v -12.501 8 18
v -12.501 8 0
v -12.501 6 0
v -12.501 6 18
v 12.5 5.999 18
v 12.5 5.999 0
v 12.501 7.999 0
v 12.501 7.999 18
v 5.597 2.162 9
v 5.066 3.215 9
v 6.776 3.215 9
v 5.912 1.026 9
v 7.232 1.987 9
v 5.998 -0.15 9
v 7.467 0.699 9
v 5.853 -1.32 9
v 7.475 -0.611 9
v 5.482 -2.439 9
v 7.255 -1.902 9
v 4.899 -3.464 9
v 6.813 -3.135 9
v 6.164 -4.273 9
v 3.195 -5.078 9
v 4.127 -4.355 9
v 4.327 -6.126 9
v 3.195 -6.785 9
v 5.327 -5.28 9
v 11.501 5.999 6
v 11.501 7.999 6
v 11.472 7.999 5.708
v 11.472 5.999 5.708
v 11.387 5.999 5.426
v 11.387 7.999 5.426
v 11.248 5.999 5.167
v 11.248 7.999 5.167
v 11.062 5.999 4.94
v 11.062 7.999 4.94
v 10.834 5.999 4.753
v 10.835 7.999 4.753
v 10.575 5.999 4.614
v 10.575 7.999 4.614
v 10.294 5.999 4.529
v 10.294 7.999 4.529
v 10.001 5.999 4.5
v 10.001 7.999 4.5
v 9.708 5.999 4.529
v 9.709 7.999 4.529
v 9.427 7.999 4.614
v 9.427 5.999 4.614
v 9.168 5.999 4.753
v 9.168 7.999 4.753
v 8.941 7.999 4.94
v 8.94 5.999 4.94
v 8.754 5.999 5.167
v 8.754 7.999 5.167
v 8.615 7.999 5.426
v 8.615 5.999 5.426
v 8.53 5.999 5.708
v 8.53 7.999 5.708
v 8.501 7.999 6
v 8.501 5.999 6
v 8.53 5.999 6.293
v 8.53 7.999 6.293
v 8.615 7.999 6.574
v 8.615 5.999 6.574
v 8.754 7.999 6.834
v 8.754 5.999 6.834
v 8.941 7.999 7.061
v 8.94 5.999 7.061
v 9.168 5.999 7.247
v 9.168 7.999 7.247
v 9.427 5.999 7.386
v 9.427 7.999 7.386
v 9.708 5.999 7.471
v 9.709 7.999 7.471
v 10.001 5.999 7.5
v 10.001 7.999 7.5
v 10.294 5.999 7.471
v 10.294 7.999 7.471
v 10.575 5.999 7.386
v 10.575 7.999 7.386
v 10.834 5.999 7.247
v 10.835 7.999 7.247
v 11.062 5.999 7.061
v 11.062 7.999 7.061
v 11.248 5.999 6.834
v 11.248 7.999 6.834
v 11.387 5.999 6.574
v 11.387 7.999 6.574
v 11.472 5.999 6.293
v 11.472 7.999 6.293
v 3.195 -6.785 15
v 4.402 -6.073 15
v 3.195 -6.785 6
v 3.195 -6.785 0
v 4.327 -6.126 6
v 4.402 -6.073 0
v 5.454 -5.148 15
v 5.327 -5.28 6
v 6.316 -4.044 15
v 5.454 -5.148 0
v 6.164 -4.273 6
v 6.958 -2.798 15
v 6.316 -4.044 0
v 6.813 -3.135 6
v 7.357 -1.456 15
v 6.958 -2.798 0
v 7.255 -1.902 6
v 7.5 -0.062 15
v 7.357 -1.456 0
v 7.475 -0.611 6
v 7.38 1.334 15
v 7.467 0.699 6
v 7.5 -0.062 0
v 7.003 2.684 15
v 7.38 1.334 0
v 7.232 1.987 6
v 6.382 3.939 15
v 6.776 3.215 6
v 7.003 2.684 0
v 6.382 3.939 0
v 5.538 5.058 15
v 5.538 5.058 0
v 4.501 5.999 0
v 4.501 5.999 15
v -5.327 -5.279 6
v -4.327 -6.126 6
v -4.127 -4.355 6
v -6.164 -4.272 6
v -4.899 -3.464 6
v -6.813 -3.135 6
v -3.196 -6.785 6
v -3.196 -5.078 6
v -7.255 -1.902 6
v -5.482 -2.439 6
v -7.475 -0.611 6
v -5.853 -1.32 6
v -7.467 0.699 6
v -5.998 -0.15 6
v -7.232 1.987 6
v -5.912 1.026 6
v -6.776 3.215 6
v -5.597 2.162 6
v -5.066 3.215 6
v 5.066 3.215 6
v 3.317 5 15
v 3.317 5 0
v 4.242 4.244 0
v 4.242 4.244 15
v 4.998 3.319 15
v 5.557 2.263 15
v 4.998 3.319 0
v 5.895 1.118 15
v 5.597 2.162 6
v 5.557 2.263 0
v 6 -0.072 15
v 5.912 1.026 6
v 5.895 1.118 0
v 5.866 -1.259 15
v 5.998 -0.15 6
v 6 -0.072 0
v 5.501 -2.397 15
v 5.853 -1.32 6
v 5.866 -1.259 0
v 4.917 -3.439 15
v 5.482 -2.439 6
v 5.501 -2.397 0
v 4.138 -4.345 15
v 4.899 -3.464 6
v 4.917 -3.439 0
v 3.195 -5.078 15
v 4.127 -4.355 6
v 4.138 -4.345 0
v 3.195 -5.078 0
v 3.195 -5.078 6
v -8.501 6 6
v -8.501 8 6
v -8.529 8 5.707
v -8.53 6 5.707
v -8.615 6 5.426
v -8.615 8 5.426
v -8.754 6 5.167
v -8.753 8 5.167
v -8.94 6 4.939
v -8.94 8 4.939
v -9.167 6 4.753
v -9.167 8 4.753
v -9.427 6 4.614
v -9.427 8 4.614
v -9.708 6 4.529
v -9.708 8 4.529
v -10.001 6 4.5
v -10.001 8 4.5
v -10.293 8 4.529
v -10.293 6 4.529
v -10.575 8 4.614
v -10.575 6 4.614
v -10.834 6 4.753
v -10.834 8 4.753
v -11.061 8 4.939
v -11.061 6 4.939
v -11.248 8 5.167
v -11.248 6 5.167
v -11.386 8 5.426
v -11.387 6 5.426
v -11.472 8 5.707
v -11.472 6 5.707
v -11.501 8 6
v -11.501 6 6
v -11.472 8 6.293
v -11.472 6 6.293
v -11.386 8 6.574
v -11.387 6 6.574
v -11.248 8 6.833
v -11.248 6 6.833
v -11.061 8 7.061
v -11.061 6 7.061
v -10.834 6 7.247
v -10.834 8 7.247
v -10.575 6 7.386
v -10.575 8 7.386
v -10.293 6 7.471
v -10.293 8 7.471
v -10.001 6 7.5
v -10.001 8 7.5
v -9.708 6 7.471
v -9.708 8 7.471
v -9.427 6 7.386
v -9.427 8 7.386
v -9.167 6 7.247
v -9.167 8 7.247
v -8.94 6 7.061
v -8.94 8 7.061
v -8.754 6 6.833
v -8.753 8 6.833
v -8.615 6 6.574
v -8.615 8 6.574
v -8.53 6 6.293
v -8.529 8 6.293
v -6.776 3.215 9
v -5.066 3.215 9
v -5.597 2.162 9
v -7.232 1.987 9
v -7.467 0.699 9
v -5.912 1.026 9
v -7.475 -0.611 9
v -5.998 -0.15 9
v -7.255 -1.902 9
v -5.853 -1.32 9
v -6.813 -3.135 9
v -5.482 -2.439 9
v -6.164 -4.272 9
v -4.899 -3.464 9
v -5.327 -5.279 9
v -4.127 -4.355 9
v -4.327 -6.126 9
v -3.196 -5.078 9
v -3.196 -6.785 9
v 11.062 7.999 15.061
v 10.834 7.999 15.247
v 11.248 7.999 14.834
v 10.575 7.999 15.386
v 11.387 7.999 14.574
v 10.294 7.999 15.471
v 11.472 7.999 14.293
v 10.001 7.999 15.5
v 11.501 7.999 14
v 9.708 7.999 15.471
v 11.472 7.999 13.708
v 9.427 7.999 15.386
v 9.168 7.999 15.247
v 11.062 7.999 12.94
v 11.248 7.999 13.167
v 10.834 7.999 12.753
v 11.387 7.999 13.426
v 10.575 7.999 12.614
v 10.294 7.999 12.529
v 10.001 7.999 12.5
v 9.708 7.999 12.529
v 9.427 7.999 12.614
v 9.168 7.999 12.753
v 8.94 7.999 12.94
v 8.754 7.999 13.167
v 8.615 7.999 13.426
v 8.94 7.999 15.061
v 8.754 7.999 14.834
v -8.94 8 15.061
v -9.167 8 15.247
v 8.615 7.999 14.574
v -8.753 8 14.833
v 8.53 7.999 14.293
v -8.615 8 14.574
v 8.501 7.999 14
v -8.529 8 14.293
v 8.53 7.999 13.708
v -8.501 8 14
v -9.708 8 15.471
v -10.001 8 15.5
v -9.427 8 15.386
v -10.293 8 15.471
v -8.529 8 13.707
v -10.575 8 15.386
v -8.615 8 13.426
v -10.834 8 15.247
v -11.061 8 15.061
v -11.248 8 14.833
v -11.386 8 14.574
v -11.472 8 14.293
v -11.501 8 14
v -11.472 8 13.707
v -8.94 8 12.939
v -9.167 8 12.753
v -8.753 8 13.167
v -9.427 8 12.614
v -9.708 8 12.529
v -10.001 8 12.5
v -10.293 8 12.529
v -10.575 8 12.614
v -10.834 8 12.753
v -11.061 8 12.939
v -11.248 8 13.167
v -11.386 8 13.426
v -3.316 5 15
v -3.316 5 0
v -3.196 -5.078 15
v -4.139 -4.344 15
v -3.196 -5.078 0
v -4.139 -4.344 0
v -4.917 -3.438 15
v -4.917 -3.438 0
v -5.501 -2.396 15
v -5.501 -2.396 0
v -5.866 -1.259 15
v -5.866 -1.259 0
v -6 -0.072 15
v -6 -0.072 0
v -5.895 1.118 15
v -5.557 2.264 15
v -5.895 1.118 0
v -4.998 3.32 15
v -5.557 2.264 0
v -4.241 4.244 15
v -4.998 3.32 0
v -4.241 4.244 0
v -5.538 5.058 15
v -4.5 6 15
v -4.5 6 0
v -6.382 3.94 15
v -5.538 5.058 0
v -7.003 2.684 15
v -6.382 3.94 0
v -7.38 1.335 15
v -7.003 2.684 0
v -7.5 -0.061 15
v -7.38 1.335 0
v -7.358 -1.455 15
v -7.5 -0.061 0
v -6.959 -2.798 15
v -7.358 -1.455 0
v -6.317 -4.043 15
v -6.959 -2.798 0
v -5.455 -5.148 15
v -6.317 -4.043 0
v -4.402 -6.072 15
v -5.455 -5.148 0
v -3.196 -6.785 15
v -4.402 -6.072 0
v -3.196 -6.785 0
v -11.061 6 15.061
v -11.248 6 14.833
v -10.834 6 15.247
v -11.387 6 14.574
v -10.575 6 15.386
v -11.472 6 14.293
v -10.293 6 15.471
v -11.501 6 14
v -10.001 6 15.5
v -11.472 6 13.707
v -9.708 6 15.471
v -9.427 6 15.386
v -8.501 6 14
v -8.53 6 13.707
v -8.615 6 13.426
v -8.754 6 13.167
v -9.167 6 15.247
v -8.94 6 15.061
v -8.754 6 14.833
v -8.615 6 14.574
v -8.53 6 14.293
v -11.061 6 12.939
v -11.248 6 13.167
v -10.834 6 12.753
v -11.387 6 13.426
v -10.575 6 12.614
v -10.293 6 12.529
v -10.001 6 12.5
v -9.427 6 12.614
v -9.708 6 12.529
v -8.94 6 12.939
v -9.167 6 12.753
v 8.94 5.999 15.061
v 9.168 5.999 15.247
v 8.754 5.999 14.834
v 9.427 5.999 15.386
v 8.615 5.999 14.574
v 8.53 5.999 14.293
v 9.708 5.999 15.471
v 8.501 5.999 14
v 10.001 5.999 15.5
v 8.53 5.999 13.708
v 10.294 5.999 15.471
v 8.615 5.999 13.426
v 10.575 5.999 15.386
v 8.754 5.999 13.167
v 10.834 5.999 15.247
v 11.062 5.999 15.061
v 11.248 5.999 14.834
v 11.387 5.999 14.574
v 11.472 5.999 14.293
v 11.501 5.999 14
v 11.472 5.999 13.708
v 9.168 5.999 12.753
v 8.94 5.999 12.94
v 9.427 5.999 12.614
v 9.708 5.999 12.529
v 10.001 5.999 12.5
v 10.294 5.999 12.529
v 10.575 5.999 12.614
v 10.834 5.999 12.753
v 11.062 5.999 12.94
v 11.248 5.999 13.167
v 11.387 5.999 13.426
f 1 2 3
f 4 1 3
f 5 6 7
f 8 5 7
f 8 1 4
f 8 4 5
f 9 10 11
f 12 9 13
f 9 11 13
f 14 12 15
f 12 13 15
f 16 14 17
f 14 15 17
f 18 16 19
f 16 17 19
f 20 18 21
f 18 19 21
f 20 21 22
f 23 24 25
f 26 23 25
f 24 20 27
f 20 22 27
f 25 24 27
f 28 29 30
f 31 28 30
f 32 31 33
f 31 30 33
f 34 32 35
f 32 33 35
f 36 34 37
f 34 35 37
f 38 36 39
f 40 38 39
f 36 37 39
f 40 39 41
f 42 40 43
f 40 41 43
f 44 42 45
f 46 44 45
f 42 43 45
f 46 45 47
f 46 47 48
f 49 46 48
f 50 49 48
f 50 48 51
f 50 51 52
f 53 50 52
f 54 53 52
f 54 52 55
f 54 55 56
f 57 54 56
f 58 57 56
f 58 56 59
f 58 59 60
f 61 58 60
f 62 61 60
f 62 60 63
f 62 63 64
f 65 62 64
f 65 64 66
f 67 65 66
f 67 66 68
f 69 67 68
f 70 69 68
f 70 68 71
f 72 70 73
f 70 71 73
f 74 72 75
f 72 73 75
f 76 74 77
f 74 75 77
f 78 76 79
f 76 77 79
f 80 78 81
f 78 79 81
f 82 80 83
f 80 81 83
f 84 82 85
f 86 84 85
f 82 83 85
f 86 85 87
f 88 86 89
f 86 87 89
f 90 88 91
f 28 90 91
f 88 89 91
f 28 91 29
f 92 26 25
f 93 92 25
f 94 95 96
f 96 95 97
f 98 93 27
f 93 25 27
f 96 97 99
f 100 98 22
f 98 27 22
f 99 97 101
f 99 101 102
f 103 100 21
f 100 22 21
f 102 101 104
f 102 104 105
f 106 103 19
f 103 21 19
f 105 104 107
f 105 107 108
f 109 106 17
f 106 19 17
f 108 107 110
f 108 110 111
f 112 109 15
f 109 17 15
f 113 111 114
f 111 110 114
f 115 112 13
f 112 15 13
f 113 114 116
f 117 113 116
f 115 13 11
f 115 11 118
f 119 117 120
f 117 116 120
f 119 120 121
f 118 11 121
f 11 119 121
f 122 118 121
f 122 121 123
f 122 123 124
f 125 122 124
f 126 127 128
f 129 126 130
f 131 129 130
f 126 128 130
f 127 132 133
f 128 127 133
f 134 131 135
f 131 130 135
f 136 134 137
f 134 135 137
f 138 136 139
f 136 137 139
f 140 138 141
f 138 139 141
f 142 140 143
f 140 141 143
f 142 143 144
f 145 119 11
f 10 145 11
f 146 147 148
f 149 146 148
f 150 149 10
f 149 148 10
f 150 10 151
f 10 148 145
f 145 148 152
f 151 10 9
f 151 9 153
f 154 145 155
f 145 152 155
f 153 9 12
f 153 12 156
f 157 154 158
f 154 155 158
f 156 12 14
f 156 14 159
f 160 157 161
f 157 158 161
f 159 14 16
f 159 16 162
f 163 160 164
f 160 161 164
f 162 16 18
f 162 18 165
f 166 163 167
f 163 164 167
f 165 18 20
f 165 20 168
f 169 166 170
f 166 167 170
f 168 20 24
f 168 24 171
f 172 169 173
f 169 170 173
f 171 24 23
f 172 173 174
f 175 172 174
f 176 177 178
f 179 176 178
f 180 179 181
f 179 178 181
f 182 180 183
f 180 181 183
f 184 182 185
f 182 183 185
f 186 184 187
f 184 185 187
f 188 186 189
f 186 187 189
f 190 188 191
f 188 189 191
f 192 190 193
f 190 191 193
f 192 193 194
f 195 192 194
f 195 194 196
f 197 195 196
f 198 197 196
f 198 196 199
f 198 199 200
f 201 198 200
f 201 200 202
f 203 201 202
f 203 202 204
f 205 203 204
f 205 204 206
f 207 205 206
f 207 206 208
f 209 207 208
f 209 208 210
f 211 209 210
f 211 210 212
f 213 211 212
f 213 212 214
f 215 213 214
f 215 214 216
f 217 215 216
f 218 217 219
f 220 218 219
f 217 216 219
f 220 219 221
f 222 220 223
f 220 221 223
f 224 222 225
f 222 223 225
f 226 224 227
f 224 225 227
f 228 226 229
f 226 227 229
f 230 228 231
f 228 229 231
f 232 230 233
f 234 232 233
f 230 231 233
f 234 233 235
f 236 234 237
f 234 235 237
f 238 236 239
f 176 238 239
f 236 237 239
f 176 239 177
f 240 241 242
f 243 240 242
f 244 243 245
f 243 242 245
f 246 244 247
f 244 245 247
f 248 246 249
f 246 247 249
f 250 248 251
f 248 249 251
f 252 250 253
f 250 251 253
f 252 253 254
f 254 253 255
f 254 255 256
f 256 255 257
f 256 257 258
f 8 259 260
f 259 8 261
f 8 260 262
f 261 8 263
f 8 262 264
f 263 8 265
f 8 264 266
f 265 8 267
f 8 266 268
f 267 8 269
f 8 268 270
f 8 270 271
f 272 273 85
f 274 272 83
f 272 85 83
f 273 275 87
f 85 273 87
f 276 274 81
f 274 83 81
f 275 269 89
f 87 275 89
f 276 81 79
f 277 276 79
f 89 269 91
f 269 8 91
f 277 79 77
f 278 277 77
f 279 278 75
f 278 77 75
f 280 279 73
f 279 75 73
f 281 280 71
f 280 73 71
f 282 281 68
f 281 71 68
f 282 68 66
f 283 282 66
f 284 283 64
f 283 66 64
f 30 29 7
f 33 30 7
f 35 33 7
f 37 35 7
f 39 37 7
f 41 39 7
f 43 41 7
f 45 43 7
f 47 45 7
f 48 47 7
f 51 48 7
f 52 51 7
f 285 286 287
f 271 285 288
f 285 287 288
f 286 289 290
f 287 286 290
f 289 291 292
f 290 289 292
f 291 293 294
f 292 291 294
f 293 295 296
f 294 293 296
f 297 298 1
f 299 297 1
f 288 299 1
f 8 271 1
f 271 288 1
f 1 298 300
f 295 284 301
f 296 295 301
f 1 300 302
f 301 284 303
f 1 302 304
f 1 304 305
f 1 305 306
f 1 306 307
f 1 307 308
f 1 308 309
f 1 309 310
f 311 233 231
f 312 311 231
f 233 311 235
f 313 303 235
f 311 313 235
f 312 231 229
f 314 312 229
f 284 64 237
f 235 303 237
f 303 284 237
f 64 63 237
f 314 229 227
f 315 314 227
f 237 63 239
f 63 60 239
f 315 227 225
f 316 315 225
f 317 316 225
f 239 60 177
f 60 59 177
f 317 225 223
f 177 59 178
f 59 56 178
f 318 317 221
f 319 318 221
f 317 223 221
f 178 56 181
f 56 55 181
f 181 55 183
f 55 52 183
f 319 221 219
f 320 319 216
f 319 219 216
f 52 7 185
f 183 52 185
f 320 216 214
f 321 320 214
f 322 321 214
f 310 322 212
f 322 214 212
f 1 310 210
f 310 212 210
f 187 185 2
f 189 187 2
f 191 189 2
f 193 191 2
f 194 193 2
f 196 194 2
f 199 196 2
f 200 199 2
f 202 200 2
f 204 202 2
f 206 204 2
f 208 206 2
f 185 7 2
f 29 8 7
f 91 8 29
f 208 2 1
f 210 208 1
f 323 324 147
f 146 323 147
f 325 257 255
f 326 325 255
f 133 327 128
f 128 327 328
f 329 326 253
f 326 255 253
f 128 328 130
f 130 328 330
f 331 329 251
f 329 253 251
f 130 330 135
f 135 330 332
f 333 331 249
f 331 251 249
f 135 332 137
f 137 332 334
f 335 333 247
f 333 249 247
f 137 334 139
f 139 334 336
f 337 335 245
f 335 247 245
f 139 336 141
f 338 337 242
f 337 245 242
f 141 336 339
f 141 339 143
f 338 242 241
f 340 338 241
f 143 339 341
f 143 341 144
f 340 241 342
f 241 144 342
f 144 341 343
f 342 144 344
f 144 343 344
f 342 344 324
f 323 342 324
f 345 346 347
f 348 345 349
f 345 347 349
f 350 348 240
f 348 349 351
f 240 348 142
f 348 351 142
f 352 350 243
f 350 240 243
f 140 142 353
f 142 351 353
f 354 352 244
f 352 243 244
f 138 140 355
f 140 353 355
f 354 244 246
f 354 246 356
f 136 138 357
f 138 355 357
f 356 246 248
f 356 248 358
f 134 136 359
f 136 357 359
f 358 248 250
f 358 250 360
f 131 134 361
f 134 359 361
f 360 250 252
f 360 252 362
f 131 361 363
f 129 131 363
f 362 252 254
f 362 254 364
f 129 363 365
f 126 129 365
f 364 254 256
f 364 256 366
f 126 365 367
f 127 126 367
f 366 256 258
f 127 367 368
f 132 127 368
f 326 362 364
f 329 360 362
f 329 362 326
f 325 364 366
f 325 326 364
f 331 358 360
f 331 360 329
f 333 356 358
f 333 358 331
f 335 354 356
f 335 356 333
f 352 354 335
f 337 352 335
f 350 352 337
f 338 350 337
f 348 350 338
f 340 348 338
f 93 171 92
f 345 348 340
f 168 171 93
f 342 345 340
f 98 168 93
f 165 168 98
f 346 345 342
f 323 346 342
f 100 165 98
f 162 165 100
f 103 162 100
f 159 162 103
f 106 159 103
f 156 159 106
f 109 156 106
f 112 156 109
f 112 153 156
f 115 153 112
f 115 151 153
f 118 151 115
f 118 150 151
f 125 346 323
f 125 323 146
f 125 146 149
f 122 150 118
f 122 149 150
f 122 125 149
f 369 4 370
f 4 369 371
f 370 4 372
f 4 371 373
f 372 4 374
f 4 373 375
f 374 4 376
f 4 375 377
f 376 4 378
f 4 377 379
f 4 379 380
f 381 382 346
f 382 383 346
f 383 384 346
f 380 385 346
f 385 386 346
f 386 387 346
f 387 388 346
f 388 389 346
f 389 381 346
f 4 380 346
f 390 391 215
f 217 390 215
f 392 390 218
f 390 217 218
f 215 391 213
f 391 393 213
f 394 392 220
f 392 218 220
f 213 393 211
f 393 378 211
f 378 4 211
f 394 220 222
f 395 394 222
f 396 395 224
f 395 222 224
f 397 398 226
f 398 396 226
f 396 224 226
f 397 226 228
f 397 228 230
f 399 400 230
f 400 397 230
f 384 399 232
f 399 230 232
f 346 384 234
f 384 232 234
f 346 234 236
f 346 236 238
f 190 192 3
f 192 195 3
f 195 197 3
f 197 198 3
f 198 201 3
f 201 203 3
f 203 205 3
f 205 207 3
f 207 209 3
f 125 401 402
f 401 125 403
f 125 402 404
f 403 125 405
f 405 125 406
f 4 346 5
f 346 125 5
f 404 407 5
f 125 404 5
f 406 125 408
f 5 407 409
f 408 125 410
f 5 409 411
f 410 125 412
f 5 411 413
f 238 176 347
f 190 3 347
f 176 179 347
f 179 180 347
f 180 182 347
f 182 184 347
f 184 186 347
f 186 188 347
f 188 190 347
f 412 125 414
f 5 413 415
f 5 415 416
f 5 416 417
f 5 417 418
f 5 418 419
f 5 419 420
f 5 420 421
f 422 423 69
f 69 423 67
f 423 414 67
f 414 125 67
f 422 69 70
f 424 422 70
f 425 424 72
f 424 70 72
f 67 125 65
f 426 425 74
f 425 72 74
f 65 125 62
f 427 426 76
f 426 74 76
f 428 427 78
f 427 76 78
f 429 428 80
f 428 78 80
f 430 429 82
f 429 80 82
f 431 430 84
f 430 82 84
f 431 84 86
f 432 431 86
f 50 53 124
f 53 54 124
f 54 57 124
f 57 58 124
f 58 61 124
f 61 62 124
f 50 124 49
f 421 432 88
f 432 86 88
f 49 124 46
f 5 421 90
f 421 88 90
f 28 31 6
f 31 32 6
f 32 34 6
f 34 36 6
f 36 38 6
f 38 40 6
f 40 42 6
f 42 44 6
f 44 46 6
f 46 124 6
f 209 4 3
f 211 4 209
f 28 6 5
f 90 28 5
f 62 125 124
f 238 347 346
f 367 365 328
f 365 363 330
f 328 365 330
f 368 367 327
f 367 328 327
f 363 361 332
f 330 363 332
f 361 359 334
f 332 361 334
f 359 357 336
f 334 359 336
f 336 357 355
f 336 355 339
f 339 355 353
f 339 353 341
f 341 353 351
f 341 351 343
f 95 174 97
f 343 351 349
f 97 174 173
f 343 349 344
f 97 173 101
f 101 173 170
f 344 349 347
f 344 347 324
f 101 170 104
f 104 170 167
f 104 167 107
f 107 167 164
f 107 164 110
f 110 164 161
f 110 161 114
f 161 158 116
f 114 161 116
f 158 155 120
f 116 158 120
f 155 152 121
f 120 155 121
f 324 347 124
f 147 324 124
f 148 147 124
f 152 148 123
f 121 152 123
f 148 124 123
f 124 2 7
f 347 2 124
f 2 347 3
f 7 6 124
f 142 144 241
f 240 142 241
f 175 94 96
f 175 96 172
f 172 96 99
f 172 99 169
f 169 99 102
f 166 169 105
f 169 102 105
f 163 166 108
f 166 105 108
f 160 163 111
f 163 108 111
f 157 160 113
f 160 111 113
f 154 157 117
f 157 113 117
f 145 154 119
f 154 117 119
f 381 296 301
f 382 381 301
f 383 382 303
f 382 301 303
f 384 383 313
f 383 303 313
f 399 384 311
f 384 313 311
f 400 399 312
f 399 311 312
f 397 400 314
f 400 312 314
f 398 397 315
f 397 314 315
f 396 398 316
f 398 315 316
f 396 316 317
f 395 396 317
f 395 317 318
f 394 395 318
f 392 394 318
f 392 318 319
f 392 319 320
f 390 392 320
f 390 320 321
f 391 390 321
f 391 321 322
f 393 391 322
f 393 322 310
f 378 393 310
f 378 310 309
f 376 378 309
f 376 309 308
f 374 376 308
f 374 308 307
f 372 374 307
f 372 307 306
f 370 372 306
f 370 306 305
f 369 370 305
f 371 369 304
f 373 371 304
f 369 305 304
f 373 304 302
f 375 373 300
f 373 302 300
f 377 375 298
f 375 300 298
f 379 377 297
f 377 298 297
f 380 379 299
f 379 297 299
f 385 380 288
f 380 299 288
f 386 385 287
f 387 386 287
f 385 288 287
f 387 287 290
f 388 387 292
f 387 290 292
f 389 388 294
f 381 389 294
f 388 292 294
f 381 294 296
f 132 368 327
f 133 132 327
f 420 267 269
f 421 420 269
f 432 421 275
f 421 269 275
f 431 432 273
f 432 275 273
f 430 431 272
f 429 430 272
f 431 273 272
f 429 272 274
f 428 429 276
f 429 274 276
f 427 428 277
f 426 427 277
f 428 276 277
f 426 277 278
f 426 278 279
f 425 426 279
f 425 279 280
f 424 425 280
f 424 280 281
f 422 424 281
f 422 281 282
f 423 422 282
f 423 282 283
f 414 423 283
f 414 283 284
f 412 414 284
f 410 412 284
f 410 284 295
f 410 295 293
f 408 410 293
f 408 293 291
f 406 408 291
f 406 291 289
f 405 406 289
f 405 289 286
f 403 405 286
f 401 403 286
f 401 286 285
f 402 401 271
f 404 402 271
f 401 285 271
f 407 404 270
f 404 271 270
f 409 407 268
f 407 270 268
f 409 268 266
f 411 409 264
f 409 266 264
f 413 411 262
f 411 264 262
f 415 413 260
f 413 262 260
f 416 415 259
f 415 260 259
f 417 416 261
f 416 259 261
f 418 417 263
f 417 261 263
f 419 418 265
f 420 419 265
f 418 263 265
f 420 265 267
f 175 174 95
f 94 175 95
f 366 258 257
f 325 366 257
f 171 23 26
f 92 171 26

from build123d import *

# Parameters (mm, degrees)
EXTRUDE_1_DEPTH     = 15
CUT_EXTRUDE_1_DEPTH = 7.5
EXTRUDE_3_DEPTH     = 18
SKETCH_3_R          = 1.5
CUT_EXTRUDE_2_DEPTH = 10


with BuildPart() as part:
    # 草图1 → 凸台-拉伸1 (new body)
    with BuildSketch(Plane.XY):
        with BuildLine():
            ThreePointArc((3.195328917, -6.785268831), (7.461194526, -0.761955539), (4.500921435, 5.999308813))
            Line((4.500921435, 5.999308813), (-4.500433628, 5.999674755))
            ThreePointArc((-4.500433628, 5.999674755), (-7.461256455, -0.761348873), (-3.195880618, -6.785008996))
            Line((-3.195880618, -6.785008996), (-3.195880618, -5.078025903))
            ThreePointArc((-3.195880618, -5.078025903), (-5.999570878, -0.071758494), (-3.316421512, 5.000134834))
            Line((-3.316421512, 5.000134834), (3.316828063, 4.999865158))
            ThreePointArc((3.316828063, 4.999865158), (5.999565023, -0.07224632), (3.195467712, -5.078285744))
            Line((3.195467712, -5.078285744), (3.195328917, -6.785268831))
        make_face()
    extrude(amount=EXTRUDE_1_DEPTH)

    # 草图2 → 切除-拉伸1 (cut, symmetric)
    with BuildSketch(Plane(origin=(0, 0, 0), x_dir=(0, 0, -1), z_dir=(1, 0, 0))):
        Polygon((-7.5, -6.785268831), (-6, -6.785268831), (-6, 3.214731169), (-9, 3.214731169), (-9, -6.785268831), align=None)
    extrude(amount=CUT_EXTRUDE_1_DEPTH, both=True, mode=Mode.SUBTRACT)

    # 草图1<4> → 凸台-拉伸3 (add)
    with BuildSketch(Plane.XY):
        Polygon((12.500487826, 5.998983598), (12.500650474, 7.999329111), (-12.500650425, 8.000345629), (-12.500650425, 5.999999996), (-4.500433628, 5.999674755), (4.500921435, 5.999308813), align=None)
    extrude(amount=EXTRUDE_3_DEPTH)

    # 草图3 → 切除-拉伸2 (cut)
    with BuildSketch(Plane(origin=(0.000325262, 7.999837357, 0), x_dir=(0.9999999991734381, -4.0658628313075474e-05, 0), z_dir=(4.0658628313075474e-05, 0.9999999991734381, 0))):
        with Locations((-10.000975697, -6)):
            Circle(SKETCH_3_R)
        with Locations((-10.000975697, -14)):
            Circle(SKETCH_3_R)
        with Locations((10.000867281, -6.000271056)):
            Circle(SKETCH_3_R)
        with Locations((10.000650456, -14.000271053)):
            Circle(SKETCH_3_R)
    extrude(amount=-CUT_EXTRUDE_2_DEPTH, mode=Mode.SUBTRACT)


solid = part.part
